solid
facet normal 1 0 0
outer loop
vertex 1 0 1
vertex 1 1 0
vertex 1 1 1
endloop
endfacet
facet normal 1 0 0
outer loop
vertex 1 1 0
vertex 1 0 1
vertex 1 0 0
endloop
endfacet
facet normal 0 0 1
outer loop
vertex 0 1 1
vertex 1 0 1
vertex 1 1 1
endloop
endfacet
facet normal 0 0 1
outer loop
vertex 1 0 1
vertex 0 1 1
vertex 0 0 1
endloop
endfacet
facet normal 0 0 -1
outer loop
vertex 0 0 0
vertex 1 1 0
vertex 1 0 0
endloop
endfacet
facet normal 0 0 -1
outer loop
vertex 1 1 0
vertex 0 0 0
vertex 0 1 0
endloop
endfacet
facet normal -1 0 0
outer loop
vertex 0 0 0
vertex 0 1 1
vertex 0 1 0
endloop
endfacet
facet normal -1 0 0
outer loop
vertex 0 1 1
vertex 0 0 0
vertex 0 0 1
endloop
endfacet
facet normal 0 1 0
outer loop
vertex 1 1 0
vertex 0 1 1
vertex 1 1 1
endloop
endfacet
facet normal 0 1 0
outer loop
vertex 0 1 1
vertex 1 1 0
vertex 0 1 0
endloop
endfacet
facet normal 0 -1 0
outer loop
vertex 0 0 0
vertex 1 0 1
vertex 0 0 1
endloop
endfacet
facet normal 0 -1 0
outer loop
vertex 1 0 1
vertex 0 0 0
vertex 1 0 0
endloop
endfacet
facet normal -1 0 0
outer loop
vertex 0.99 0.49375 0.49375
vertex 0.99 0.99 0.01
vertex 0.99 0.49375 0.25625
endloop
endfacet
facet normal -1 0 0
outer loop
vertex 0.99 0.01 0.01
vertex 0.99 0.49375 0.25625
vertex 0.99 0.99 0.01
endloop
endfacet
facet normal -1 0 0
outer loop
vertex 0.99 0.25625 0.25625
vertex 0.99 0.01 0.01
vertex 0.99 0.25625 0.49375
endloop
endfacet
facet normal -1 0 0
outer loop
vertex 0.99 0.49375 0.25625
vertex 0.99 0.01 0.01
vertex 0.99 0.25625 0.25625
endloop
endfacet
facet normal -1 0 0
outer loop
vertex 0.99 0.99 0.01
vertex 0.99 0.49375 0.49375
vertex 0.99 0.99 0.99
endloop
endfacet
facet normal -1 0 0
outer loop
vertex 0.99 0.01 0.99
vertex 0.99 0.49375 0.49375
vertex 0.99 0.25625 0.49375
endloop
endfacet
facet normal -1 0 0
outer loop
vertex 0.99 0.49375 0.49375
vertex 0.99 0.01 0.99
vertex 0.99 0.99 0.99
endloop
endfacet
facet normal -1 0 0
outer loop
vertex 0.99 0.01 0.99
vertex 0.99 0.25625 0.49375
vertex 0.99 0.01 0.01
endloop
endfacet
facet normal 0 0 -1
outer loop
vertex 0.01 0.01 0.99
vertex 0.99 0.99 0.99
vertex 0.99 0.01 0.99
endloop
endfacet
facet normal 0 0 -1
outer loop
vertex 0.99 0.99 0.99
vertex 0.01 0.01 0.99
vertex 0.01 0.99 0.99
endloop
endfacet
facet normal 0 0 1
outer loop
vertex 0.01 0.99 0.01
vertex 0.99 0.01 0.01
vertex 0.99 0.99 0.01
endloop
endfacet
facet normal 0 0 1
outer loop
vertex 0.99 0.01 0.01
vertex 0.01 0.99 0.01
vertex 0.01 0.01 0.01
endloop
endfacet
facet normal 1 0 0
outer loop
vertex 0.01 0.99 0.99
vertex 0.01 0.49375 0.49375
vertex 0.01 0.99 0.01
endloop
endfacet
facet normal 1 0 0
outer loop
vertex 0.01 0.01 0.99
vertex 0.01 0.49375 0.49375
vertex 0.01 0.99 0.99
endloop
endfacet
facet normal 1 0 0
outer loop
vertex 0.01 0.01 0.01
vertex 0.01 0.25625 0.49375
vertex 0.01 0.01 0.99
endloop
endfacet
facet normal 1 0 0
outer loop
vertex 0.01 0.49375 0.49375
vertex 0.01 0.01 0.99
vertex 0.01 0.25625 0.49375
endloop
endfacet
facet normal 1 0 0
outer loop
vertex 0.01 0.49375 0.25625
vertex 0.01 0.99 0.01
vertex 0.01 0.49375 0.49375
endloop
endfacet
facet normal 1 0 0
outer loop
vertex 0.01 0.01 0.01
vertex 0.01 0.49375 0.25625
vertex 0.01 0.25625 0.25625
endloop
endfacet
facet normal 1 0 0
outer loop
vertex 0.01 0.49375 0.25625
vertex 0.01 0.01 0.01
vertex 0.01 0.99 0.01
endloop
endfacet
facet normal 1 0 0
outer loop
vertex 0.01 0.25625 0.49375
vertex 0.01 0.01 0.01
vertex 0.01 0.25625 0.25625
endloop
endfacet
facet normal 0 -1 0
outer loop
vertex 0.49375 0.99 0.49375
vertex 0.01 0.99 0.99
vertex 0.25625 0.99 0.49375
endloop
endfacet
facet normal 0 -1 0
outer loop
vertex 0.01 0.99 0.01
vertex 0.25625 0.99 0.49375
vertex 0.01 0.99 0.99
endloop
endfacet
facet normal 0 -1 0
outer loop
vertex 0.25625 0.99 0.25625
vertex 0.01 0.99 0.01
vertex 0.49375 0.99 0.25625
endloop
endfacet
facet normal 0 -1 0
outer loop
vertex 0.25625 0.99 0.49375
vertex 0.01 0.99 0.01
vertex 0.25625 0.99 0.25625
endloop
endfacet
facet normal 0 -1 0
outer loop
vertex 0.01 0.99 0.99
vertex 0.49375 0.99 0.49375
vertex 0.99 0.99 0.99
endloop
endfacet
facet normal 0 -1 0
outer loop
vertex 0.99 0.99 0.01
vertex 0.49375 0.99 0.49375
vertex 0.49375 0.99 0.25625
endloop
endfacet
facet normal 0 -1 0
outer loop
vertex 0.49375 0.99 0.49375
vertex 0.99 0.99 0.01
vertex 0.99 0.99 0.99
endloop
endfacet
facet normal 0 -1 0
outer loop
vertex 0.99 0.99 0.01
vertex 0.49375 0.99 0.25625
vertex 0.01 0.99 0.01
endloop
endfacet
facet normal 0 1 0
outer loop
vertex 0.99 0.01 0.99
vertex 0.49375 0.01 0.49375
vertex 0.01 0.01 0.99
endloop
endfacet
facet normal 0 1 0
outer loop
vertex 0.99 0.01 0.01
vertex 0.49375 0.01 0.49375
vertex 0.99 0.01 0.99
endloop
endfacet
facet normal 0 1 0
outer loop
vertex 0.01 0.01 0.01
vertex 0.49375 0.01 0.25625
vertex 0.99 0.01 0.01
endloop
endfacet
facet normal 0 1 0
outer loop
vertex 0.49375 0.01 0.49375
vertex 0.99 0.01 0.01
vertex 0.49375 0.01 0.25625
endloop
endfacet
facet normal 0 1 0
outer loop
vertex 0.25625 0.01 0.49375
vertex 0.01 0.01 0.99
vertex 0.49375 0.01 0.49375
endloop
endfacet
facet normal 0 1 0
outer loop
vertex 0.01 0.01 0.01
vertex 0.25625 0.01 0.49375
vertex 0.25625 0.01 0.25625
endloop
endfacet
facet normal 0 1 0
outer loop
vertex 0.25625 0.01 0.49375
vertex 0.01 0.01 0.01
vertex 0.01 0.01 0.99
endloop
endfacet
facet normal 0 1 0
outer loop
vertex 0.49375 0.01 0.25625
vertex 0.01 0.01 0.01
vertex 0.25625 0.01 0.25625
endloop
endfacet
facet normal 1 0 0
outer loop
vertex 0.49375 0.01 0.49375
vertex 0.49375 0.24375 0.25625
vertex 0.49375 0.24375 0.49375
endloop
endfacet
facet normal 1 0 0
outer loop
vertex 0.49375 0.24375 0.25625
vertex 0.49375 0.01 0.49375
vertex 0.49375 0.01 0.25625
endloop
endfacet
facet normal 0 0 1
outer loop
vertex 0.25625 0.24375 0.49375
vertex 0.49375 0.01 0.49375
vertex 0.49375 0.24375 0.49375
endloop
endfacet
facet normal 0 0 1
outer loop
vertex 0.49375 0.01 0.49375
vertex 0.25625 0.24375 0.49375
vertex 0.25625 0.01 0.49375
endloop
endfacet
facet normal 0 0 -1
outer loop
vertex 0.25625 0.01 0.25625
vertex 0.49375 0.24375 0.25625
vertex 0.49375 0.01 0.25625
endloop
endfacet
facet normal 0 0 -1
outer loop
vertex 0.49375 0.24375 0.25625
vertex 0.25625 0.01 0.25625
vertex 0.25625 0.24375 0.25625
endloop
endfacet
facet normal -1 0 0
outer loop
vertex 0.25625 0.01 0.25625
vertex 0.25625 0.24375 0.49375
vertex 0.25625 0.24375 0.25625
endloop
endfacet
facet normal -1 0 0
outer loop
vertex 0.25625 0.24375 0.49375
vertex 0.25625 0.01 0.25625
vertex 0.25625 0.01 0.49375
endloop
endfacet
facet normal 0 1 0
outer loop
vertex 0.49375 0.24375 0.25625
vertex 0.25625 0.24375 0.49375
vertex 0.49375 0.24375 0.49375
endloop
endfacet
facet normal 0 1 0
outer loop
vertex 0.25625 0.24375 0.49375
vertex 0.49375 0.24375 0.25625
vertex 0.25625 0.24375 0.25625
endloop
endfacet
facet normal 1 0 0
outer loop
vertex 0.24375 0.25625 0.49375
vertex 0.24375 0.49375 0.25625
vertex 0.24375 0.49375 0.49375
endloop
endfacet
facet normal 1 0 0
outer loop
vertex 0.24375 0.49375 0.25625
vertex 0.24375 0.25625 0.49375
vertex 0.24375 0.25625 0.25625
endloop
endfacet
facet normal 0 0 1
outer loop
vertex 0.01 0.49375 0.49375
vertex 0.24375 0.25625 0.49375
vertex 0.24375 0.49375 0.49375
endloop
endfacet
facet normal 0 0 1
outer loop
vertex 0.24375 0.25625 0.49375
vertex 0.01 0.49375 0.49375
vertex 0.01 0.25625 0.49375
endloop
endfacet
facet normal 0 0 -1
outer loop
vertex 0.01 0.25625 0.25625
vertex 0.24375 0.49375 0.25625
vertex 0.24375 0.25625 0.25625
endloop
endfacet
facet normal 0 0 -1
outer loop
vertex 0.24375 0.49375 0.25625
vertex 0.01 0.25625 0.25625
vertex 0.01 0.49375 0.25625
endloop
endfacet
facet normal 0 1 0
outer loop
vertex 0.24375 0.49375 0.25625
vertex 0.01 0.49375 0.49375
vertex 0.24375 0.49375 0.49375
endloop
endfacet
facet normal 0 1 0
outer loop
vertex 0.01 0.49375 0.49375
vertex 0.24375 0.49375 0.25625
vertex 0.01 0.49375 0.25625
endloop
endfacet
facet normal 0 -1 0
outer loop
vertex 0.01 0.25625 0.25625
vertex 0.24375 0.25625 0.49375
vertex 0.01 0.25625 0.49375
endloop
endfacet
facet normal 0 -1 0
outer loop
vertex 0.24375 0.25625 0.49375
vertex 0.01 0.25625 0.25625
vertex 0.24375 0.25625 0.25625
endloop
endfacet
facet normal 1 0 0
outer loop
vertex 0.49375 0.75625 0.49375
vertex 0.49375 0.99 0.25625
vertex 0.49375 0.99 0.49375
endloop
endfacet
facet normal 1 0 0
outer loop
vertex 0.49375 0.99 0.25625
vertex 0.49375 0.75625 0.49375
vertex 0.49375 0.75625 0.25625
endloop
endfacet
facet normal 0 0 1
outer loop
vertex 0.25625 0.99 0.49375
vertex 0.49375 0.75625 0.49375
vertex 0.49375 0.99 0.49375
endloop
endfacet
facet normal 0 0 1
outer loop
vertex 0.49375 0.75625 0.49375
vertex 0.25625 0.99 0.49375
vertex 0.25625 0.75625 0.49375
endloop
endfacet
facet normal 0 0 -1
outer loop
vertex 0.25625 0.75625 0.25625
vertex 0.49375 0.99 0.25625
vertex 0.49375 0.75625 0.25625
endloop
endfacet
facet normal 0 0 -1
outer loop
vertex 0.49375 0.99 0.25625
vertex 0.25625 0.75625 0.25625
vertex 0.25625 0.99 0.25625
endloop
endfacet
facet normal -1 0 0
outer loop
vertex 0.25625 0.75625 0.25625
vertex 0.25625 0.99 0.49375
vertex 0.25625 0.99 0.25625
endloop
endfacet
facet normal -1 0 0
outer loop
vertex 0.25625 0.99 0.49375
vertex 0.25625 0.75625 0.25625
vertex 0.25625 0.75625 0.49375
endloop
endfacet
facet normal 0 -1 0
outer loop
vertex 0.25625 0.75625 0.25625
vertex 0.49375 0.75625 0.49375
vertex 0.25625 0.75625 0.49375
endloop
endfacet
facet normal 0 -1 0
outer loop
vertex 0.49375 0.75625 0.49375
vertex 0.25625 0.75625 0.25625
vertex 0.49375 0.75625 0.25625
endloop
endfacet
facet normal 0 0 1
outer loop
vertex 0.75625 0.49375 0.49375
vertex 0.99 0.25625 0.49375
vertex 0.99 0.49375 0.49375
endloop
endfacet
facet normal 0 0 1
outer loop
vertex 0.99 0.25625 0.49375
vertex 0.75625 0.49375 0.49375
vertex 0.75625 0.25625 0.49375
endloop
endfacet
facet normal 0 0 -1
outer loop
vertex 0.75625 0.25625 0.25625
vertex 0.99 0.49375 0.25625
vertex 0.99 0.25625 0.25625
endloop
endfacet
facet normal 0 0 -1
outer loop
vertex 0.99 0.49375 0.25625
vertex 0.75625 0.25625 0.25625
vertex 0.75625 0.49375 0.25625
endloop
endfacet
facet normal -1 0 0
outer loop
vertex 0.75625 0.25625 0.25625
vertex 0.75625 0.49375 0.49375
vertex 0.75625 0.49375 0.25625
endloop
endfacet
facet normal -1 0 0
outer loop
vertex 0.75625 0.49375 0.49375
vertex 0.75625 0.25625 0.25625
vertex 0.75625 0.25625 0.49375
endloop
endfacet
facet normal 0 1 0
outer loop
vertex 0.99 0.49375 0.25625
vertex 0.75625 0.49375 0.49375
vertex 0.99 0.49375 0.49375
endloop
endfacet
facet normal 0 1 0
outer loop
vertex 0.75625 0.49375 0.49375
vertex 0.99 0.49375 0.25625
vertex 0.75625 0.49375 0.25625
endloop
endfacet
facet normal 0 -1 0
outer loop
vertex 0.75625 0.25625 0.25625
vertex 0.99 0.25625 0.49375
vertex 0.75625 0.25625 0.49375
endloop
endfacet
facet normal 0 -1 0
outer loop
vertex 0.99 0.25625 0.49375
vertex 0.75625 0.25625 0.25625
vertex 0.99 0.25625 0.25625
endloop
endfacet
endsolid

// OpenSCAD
translate([0.375, 0.125, 0.375]) color([0.9466232172358584, 0.37576346302440744, 0.7738670793165449]) cube([0.2375, 0.2375, 0.2375], center=true);
translate([0.125, 0.375, 0.375]) color([0.5737219409592526, 0.2383097732807936, 0.6780550854220364]) cube([0.2375, 0.2375, 0.2375], center=true);
translate([0.375, 0.875, 0.375]) color([0.6000681642891845, 0.055512920219609074, 0.23470921943385203]) cube([0.2375, 0.2375, 0.2375], center=true);
translate([0.875, 0.375, 0.375]) color([0.4201773127248388, 0.6373251495517093, 0.24998835023024624]) cube([0.2375, 0.2375, 0.2375], center=true);
color([0.3,0.3,0.3,0.3]) difference() { cube([1,1,1]); translate([0.01,0.01,0.01]) cube([0.98,0.98,0.98]); }
